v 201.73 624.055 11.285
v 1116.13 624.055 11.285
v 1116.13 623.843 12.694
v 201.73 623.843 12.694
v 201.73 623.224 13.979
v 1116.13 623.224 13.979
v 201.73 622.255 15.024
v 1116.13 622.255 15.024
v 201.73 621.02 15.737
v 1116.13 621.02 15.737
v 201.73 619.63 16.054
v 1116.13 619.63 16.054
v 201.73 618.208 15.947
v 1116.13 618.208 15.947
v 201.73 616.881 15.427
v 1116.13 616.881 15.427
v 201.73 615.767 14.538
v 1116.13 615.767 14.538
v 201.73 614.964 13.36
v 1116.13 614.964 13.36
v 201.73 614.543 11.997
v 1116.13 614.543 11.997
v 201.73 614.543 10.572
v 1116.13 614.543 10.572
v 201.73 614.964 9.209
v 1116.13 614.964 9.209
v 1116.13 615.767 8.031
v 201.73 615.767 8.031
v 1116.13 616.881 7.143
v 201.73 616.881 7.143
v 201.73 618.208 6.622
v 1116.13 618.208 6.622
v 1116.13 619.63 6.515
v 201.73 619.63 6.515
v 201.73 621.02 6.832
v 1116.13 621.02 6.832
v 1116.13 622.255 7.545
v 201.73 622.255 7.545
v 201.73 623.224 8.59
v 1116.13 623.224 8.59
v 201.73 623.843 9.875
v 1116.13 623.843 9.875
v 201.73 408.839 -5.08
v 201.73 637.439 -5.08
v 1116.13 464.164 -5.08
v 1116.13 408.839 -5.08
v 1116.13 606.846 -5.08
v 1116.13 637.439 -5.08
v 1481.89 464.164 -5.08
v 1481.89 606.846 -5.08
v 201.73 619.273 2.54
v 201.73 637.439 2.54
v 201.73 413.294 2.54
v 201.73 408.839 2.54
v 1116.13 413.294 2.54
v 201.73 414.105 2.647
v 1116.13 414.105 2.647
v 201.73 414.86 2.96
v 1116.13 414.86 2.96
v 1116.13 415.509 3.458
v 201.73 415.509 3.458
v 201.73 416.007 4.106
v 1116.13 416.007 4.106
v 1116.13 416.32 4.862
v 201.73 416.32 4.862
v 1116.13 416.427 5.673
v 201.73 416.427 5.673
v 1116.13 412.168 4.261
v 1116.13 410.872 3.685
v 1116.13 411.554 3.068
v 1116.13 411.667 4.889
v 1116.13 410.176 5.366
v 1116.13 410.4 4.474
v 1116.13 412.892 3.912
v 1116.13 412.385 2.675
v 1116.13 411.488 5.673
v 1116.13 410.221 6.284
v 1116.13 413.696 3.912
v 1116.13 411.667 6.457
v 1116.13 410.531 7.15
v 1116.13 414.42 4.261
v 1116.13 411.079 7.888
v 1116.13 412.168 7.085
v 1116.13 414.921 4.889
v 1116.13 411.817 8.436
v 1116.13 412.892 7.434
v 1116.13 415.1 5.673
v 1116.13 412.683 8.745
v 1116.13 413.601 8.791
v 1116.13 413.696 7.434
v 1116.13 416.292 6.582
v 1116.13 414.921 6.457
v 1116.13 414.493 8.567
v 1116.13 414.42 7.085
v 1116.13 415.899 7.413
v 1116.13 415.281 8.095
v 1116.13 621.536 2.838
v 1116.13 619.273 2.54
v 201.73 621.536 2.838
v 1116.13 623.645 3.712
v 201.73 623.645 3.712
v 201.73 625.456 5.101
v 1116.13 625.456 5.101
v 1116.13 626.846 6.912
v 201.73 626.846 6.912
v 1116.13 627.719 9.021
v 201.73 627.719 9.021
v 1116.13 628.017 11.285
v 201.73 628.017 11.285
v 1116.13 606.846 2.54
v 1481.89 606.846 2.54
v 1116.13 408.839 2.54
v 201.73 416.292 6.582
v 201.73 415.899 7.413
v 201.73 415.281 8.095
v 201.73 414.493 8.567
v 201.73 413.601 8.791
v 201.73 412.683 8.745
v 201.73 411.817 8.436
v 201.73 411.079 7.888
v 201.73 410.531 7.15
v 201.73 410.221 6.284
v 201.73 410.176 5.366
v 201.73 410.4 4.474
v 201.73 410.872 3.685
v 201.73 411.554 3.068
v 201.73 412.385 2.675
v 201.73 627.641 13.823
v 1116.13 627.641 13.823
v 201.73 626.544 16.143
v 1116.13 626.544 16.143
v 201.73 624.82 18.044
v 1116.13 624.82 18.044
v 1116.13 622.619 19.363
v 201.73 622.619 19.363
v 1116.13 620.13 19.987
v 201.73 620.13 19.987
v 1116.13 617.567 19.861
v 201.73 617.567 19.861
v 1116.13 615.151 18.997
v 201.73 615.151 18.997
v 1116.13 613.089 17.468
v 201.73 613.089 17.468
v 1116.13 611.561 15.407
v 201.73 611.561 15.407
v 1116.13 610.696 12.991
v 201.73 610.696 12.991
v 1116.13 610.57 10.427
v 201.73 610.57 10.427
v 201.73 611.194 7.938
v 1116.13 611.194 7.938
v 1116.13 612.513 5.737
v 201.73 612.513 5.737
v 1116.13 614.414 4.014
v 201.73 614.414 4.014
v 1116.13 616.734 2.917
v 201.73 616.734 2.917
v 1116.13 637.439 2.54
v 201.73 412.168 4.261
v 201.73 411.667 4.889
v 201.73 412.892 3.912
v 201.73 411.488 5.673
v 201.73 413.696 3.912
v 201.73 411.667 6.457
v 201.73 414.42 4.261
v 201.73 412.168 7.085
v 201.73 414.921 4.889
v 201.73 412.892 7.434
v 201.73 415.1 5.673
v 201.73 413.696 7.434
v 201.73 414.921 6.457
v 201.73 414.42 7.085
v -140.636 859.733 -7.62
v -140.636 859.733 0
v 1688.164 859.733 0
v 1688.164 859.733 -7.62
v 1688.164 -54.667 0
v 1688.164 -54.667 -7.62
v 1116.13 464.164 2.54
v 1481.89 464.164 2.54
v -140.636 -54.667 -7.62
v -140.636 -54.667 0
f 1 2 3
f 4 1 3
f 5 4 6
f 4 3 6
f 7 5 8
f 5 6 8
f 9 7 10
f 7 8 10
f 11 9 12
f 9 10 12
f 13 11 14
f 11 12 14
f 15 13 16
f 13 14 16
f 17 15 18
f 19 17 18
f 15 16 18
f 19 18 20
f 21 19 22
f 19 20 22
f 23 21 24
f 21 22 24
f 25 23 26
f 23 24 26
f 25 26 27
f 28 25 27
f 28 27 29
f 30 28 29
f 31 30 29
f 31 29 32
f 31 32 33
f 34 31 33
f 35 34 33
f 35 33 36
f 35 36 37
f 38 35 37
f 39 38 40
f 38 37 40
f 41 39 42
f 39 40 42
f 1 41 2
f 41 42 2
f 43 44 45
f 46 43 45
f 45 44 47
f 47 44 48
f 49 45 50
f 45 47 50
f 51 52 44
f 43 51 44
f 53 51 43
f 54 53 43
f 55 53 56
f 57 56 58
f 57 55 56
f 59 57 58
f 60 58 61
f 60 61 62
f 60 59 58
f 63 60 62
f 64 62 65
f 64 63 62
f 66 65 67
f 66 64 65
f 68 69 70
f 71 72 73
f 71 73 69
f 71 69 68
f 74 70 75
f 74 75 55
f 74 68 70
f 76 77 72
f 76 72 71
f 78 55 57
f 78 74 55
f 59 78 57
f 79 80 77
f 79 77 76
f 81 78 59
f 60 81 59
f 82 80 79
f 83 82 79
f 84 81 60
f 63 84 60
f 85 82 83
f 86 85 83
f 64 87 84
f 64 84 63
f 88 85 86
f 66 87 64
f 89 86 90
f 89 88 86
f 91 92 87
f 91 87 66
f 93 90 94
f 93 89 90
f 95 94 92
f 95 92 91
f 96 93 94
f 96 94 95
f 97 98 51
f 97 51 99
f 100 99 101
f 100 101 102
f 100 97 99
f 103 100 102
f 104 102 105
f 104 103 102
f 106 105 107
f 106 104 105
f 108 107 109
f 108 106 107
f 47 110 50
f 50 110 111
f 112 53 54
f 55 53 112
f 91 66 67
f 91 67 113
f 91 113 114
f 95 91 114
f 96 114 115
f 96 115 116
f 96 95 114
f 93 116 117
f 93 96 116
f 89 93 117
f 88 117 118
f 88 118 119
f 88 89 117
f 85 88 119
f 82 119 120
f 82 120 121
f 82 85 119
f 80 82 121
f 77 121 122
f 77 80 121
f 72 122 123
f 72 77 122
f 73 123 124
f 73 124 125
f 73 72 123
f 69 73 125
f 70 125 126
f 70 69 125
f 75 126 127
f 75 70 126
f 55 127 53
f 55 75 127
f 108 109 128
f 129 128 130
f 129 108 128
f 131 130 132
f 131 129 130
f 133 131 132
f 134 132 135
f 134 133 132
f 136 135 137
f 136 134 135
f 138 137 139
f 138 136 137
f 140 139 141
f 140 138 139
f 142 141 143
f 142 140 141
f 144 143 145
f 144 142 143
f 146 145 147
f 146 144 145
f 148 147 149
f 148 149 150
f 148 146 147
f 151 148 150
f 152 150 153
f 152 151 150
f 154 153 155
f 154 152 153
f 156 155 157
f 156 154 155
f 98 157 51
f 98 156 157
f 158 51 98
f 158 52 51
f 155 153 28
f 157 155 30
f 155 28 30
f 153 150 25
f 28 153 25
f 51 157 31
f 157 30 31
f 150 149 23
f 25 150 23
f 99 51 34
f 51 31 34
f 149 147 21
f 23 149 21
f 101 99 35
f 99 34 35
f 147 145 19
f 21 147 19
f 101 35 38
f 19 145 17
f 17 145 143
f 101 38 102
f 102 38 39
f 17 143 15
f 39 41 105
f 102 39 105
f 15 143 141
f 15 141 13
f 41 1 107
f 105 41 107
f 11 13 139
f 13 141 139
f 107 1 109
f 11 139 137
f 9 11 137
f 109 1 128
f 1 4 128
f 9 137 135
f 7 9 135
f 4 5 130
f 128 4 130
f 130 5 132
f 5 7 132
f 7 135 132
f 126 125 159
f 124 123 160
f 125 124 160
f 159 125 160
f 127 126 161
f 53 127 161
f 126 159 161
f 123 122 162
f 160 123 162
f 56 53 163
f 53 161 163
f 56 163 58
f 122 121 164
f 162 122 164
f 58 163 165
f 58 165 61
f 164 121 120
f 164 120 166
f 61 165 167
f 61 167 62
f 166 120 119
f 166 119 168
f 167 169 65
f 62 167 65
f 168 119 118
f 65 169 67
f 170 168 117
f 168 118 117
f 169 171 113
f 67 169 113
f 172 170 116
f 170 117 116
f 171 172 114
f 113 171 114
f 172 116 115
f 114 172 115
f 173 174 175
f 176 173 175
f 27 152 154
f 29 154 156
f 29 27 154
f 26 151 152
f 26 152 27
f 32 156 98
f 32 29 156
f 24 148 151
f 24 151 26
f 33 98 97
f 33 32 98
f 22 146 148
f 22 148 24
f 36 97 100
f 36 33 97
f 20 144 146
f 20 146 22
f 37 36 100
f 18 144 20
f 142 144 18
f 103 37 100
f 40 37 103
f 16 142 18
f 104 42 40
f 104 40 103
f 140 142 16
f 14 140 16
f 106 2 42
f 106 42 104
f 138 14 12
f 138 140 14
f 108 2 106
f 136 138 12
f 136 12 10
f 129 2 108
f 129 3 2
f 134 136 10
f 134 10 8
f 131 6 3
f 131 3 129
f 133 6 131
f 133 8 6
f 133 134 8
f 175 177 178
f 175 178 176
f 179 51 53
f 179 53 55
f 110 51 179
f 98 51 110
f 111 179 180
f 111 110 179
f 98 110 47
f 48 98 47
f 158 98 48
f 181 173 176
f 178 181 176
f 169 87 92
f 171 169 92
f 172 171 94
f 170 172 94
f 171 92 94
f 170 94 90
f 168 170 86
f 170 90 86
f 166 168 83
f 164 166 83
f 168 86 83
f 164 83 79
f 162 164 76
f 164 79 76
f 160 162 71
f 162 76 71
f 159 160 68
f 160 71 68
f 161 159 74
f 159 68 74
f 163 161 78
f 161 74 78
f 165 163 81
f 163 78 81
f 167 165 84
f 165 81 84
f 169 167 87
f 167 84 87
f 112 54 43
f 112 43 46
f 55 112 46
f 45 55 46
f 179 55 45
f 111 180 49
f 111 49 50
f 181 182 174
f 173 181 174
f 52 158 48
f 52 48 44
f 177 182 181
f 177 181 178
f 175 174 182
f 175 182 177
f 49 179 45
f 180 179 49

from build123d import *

# Parameters (mm, degrees)
F0_W      = 1828.8
F0_H      = 914.4
F2_DEPTH  = 7.62
F3_W      = 365.76
F3_H      = 142.6814980805
F4_DEPTH  = 7.62
F7_R      = 3.1328282943
F7_R_2    = 1.8062049827
F8_DEPTH  = 914.4
F10_R     = 8.7445702097
F10_R_2   = 4.7827305273
F11_DEPTH = 914.4


# Not quite as in the source:
# - the program builds the solid bodies; features that only make, move or delete a surface that nothing else refers to are left out


with BuildPart() as f2:
    # F0 (on Top) → F2 (new body)
    with BuildSketch(Plane.XY):
        with Locations((773.7635708094, 402.5332610428)):
            Rectangle(F0_W, F0_H)
    extrude(amount=-F2_DEPTH)


with BuildPart() as f4:
    # F3 (on Top) → F4 (new body)
    with BuildSketch(Plane.XY):
        Polygon((87.4297803879, 78.6388413668), (-826.9702196121, 78.6388413668), (-826.9702196121, -149.9611586332), (87.4297803879, -149.9611586332), (87.4297803879, -94.6356877685), (87.4297803879, 48.045810312), align=None)
        with Locations((270.3097803879, -23.2949387282)):
            Rectangle(F3_W, F3_H)
    extrude(amount=-F4_DEPTH)


with BuildPart() as f4_1:
    # F5: moved
    add(f4.part.moved(Location((1028.7, 558.8, 2.54))))

    # F7 (on offset) → F8 (join, through all)
    with BuildSketch(Plane.YZ.offset(1116.1297803879)):
        with Locations((413.2940471172, 5.6728282943)):
            Circle(F7_R)
        with Locations((413.2940471172, 5.6728282943)):
            Circle(F7_R_2, mode=Mode.SUBTRACT)
    extrude(amount=-F8_DEPTH)

    # F10 (on offset) → F11 (join, through all)
    with BuildSketch(Plane.YZ.offset(1116.1297803879)):
        with Locations((619.2727088928, 11.2845702097)):
            Circle(F10_R)
        with Locations((619.2727088928, 11.2845702097)):
            Circle(F10_R_2, mode=Mode.SUBTRACT)
    extrude(amount=-F11_DEPTH)


solid = Compound([f2.part, f4_1.part])
